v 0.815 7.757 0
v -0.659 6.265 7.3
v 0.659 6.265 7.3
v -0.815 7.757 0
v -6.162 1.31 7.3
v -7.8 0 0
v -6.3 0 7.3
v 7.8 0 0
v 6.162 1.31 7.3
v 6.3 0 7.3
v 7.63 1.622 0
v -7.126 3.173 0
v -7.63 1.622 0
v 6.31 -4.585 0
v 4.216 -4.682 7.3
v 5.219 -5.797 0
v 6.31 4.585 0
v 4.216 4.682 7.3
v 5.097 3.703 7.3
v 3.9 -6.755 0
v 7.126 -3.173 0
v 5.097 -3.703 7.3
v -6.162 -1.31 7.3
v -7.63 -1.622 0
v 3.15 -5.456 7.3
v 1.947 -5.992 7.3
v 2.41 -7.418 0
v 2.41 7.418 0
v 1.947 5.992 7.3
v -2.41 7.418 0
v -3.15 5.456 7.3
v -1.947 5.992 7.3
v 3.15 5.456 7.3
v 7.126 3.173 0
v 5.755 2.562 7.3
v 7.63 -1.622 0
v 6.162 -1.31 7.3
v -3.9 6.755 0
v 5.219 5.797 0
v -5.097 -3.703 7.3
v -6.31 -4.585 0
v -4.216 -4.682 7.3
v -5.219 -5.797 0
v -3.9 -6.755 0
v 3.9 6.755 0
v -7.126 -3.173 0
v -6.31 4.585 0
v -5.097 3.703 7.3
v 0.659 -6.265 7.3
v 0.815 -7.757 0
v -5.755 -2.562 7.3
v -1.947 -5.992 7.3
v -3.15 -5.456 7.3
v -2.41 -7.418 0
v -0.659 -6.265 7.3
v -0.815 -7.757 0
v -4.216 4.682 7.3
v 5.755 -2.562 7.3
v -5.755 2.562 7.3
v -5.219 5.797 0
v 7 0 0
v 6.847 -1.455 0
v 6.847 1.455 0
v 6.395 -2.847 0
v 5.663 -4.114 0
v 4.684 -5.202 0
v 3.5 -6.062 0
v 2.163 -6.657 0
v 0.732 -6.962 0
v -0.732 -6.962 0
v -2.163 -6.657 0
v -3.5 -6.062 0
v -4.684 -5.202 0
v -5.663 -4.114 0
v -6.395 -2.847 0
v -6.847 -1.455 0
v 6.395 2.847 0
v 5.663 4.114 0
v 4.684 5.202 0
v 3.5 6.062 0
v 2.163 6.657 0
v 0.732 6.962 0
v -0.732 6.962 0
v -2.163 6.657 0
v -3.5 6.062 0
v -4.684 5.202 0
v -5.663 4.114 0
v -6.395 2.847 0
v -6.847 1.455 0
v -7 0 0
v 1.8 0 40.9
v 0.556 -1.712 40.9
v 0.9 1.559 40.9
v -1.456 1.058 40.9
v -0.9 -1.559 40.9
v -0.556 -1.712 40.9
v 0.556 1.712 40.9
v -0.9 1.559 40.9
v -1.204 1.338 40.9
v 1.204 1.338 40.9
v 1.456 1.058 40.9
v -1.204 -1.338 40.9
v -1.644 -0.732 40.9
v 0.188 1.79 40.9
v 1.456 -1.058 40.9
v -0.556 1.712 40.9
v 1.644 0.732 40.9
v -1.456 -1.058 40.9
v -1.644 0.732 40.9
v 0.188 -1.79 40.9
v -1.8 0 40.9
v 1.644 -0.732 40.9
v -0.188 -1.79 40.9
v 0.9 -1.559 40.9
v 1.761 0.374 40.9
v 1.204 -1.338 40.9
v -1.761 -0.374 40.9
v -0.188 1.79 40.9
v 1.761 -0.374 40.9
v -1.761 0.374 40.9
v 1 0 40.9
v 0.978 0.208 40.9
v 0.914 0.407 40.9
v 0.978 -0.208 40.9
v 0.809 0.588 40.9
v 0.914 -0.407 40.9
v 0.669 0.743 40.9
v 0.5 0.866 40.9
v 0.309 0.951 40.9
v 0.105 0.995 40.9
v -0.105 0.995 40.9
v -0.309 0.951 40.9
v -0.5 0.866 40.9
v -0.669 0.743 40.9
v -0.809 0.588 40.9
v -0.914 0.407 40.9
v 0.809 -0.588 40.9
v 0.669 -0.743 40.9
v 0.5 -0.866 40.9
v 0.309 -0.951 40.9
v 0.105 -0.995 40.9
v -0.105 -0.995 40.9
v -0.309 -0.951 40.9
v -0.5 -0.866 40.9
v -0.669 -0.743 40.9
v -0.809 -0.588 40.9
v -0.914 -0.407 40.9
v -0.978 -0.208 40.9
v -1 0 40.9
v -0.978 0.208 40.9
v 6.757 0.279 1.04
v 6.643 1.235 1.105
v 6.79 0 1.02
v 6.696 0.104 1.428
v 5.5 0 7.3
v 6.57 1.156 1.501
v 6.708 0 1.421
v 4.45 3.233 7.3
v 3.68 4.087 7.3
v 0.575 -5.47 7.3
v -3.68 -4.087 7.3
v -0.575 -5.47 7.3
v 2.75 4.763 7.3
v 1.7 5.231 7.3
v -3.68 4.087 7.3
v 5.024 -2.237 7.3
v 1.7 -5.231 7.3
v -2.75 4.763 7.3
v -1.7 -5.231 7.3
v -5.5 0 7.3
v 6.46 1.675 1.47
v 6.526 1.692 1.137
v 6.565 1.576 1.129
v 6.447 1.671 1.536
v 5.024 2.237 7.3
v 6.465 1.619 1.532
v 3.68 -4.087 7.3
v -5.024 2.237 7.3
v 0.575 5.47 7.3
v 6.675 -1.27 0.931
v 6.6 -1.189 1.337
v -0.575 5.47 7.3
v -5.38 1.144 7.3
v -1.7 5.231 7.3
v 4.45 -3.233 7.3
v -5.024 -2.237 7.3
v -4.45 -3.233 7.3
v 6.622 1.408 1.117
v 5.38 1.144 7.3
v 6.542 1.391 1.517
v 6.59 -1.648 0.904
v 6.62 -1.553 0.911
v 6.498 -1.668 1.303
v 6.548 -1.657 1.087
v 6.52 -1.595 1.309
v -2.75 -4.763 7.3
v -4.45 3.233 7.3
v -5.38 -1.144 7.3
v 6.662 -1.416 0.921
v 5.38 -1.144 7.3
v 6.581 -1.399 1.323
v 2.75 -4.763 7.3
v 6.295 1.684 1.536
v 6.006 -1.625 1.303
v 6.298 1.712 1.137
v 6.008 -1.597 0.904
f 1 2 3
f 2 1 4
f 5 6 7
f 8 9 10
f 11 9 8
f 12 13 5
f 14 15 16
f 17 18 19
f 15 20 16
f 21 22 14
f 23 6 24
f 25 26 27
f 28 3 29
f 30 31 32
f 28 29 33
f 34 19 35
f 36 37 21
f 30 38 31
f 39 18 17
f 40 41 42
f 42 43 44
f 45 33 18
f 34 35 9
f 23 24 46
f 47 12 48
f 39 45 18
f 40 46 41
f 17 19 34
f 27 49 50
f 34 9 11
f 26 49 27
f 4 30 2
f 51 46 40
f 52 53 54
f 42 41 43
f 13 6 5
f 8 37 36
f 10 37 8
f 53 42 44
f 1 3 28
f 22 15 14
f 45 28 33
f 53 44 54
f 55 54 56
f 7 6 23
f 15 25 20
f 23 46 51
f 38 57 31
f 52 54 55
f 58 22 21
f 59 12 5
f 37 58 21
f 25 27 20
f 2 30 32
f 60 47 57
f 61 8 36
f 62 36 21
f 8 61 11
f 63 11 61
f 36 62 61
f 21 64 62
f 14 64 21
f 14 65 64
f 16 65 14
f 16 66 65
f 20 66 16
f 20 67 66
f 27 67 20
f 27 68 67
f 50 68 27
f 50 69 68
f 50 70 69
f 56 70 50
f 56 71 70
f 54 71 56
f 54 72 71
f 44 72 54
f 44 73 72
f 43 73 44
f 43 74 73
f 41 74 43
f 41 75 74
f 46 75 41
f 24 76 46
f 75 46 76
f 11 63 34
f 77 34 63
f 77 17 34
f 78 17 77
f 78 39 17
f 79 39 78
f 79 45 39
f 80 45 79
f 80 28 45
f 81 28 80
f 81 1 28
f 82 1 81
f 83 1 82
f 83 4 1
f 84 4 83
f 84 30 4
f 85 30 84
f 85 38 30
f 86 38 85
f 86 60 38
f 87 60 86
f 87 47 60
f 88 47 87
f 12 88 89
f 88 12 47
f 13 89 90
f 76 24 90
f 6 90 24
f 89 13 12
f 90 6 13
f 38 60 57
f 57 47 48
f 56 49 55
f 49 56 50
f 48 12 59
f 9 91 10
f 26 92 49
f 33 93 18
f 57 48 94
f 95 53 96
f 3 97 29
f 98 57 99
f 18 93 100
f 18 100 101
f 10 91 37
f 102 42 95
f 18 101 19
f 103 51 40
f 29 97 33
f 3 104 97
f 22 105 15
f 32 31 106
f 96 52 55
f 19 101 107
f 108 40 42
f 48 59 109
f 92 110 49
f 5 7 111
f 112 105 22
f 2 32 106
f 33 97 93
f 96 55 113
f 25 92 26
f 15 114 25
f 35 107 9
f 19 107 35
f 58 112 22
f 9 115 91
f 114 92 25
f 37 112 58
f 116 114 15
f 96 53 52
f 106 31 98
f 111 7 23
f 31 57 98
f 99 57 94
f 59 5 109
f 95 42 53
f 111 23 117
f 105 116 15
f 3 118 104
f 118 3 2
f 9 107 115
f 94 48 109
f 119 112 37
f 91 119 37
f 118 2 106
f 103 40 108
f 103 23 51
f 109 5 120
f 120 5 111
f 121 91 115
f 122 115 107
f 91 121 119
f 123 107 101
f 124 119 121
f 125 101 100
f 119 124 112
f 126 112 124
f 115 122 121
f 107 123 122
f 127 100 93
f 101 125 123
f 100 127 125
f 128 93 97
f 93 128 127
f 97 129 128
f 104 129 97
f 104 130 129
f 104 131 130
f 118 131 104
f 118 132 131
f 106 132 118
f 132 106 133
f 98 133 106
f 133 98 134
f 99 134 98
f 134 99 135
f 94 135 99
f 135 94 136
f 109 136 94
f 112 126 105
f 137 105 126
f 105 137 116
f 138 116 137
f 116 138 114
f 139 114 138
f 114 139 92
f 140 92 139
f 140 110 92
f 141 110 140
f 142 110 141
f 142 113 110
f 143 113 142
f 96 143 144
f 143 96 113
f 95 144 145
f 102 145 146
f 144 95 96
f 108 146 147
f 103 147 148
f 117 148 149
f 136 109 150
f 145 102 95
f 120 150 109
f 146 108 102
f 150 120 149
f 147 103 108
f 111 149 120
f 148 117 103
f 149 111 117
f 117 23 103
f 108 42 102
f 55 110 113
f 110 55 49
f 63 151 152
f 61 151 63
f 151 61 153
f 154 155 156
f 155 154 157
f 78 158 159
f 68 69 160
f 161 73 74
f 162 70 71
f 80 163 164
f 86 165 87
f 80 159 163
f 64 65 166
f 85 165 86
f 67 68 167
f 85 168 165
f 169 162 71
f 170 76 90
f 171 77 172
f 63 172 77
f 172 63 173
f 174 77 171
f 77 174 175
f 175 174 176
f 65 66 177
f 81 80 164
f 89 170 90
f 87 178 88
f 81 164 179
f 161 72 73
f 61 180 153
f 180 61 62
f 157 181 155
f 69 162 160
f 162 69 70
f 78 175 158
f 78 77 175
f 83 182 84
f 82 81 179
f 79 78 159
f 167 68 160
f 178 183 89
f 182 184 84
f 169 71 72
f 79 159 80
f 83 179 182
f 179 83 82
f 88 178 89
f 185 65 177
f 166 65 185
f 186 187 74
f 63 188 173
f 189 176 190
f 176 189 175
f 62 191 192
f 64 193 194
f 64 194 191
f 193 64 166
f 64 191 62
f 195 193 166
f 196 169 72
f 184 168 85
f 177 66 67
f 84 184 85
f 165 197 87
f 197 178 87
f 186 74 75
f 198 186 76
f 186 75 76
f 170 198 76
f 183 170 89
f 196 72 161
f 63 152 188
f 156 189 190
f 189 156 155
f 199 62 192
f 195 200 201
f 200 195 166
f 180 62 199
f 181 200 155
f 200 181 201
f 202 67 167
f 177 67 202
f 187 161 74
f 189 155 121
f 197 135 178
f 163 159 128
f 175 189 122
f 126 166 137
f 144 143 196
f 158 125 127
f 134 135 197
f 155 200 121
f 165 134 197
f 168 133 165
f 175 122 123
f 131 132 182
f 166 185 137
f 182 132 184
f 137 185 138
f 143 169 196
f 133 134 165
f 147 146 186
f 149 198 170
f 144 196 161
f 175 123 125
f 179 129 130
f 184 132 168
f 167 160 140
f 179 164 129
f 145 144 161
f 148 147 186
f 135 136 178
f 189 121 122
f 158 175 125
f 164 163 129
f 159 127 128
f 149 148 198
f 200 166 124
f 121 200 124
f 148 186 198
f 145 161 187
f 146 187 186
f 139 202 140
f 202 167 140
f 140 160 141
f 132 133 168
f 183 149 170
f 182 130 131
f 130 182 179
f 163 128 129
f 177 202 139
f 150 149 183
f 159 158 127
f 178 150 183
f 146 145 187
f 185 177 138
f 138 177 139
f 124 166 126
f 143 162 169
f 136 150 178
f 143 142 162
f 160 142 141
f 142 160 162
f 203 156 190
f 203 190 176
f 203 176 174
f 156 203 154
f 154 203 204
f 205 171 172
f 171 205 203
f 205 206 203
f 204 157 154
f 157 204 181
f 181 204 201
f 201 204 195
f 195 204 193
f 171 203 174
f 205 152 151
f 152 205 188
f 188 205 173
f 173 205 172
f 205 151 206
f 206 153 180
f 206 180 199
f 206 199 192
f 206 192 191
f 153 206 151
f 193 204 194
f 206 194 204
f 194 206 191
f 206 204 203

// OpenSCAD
total_height = 40.9;
base_height = 7.3;
base_bottom_inner_diameter = 14;
base_top_inner_diameter = 11;
tip_top_inner_diameter = 2;
wall_thickness = 0.8;

$fs = .01;

module ear_speculum(total_height = 40.9, base_height = 7.3, base_bottom_inner_diameter = 14, base_top_inner_diameter = 11, tip_top_inner_diameter = 2, wall_thickness = 0.8){
    base_bottom_inner_radius =  base_bottom_inner_diameter / 2;
    base_top_inner_radius =  base_top_inner_diameter / 2; 
    tip_top_inner_radius =  tip_top_inner_diameter / 2;
    union(){
        difference(){
            union(){
                // Base
                cylinder(h= base_height,r1= base_bottom_inner_radius + wall_thickness, r2=base_top_inner_radius + wall_thickness); 
                // Tip
                translate([0, 0, base_height]) 
                cylinder(h= total_height - base_height ,r1= base_top_inner_radius + wall_thickness, r2=tip_top_inner_radius + wall_thickness); 
            }

            // Inner space
            union(){
                // Base inner space
                cylinder(h= base_height,r1= base_bottom_inner_radius, r2=base_top_inner_radius); 
                // Tip inner space
                translate([0, 0, base_height]) 
                cylinder(h= total_height - base_height ,r1= base_top_inner_radius, r2=tip_top_inner_radius ); 
            }
        }

        // Hook
        translate([((base_bottom_inner_radius + base_top_inner_radius)/2) + (wall_thickness/ 2), 0, 1.22])
        rotate([0, 4, -95])
        cube([3.33, 1.0, 0.4], center = true);
    }
}


ear_speculum(
    total_height,
    base_height,
    base_bottom_inner_diameter,
    base_top_inner_diameter,
    tip_top_inner_diameter,
    wall_thickness
);
